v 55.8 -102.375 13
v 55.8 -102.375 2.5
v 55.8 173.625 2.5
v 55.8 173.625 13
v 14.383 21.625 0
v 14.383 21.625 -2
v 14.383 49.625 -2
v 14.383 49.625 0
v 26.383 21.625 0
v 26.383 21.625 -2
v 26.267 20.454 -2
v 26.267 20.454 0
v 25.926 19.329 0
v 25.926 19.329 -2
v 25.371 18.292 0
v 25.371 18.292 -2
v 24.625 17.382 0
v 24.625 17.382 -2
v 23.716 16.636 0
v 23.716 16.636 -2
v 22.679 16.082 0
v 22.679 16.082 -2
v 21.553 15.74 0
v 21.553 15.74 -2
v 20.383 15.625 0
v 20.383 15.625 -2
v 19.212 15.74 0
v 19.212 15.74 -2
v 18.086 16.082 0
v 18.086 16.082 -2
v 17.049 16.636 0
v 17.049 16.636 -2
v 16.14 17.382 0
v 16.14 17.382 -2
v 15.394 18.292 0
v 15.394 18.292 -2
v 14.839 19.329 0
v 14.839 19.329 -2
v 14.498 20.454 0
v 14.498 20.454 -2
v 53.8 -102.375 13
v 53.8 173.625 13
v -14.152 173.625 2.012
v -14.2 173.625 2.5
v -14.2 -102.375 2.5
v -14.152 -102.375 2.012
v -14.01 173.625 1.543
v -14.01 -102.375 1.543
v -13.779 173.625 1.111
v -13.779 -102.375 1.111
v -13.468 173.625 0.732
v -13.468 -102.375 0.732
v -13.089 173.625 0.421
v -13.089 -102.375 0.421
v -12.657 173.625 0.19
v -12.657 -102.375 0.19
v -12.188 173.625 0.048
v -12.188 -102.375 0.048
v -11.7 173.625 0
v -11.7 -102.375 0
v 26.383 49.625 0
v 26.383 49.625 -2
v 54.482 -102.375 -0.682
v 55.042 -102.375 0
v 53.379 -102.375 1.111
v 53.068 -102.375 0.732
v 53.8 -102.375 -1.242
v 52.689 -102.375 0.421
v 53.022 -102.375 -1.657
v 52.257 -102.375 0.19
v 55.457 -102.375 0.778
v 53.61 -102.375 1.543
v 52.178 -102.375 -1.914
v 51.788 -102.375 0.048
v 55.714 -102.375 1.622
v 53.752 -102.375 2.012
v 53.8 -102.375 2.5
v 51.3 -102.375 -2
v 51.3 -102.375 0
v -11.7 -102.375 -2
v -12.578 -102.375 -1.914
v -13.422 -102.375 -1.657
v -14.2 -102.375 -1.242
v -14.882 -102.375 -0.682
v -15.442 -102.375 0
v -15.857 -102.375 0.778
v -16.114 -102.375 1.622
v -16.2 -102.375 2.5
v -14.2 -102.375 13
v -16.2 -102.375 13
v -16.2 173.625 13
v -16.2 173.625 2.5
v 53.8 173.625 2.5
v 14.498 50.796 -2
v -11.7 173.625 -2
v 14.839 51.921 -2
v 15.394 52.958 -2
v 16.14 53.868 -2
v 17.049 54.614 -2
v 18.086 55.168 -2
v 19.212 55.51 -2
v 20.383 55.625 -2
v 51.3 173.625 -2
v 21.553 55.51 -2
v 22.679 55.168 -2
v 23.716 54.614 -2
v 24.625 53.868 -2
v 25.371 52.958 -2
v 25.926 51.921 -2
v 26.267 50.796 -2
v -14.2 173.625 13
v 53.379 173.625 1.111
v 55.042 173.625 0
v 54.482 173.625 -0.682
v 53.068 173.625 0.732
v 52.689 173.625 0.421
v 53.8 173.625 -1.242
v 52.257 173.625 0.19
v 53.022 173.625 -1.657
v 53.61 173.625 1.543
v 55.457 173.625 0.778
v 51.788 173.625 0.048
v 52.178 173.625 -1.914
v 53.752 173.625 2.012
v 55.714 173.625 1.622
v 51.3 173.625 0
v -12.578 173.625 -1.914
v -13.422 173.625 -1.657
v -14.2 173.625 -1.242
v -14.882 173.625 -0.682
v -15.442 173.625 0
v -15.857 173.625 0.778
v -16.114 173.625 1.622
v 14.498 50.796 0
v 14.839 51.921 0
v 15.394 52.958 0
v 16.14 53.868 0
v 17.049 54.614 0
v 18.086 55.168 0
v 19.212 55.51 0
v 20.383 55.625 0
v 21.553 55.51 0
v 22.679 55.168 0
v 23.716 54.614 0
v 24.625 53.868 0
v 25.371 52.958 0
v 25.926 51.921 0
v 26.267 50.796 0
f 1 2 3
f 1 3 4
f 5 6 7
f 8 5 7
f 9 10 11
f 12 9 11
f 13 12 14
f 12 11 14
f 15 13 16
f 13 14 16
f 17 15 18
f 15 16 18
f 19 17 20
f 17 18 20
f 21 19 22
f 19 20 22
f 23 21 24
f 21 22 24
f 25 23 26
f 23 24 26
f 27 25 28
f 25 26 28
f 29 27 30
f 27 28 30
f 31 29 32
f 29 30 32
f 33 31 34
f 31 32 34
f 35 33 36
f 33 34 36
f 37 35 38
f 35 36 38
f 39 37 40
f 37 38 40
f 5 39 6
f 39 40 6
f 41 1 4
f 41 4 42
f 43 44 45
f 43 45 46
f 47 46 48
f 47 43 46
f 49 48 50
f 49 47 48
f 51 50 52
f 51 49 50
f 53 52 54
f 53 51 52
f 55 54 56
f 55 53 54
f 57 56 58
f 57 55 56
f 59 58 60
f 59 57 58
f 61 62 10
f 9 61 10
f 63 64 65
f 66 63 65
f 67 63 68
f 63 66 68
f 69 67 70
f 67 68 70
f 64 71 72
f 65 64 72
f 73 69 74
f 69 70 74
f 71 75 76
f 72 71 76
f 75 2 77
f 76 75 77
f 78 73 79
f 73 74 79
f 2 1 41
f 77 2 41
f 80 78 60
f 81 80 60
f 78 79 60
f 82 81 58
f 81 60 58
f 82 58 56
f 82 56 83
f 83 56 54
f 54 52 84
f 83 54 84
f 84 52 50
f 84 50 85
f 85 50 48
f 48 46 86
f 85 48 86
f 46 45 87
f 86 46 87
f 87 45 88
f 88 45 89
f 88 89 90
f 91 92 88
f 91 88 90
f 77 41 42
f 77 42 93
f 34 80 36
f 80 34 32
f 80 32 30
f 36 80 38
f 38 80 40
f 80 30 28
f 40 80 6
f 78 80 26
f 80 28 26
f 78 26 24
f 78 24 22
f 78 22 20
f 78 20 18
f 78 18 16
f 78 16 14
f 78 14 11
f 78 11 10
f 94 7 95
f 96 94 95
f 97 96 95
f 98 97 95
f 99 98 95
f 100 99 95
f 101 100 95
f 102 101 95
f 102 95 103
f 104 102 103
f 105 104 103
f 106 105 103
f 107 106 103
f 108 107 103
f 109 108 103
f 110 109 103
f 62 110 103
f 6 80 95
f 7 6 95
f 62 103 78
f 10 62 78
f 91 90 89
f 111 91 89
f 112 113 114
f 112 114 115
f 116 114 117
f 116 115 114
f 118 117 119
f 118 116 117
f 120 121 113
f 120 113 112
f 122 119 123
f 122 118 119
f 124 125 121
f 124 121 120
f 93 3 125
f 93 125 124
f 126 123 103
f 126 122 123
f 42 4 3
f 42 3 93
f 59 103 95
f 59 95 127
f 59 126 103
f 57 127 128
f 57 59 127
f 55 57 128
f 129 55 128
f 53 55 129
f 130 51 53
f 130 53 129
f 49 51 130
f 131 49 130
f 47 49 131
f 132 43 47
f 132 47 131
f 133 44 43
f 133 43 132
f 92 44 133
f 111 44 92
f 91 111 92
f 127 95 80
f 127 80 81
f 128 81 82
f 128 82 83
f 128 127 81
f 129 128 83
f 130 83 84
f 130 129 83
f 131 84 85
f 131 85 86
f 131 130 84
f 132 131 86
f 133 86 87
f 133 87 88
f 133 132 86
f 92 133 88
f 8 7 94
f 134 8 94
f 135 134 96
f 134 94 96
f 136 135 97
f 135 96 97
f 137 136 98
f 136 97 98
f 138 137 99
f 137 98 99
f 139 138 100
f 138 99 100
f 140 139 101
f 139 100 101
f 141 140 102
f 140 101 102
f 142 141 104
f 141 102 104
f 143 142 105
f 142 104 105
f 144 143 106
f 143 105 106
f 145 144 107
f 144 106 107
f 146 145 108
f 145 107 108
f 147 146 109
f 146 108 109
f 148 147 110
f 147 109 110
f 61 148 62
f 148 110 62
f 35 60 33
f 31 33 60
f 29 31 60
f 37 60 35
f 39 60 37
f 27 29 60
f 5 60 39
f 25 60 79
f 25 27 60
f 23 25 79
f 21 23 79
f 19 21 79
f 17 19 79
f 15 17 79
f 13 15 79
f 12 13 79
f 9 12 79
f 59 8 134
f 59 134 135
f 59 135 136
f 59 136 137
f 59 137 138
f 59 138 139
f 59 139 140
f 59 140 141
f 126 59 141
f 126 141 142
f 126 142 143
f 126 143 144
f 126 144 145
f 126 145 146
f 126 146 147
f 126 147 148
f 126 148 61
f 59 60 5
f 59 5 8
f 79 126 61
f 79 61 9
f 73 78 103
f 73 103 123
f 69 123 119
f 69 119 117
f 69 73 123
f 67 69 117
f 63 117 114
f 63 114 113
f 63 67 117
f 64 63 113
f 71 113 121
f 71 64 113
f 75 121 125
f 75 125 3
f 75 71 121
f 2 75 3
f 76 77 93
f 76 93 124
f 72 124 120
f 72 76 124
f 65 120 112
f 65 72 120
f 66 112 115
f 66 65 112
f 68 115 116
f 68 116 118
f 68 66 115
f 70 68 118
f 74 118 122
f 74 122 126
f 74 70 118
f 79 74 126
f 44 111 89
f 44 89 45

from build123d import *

# Parameters (mm, degrees)
SKETCH1_W                    = 72
SKETCH1_H                    = 276
BASE_FLANGE1_DEPTH           = 2
EDGE_FLANGE1_STRIP_W         = 13
EDGE_FLANGE1_STRIP_H         = 2
EDGE_FLANGE1_STRIP_CUT_DEPTH = 276
EDGE_FLANGE1_DEPTH           = 276
EDGE_FLANGE2_STRIP_W         = 13
EDGE_FLANGE2_STRIP_H         = 2
EDGE_FLANGE2_STRIP_CUT_DEPTH = 276
EDGE_FLANGE2_DEPTH           = 276
CUT_EXTRUDE1_DEPTH           = 183.834024801
CUT_EXTRUDE1_DEPTH_BACK      = 183.834024801


# Sheet-metal steps are written as plain solids
with BuildPart() as part:
    # Sketch1 → Base-Flange1 (new body)
    with BuildSketch(Plane.XY):
        with Locations((19.8, 35.625)):
            Rectangle(SKETCH1_W, SKETCH1_H)
    extrude(amount=-BASE_FLANGE1_DEPTH)

    # Edge-Flange1 strip (across the edge) → Edge-Flange1 strip cut (cut)
    with BuildSketch(Plane(origin=(55.8, -102.375, 0), x_dir=(-1, 0, 0), z_dir=(0, 1, 0))):
        with Locations((-2, -1)):
            Rectangle(EDGE_FLANGE1_STRIP_W, EDGE_FLANGE1_STRIP_H)
    extrude(amount=EDGE_FLANGE1_STRIP_CUT_DEPTH, mode=Mode.SUBTRACT)

    # Edge-Flange1 section (across the edge) → Edge-Flange1 (add)
    with BuildSketch(Plane(origin=(55.8, -102.375, 0), x_dir=(-1, 0, 0), z_dir=(0, 1, 0))):
        with BuildLine():
            Line((0, 2.5), (0, 13))
            Line((0, 13), (2, 13))
            Line((2, 13), (2, 2.5))
            ThreePointArc((2, 2.5), (2.732233047, 0.732233047), (4.5, 0))
            Line((4.5, 0), (4.5, -2))
            ThreePointArc((4.5, -2), (1.318019485, -0.681980515), (0, 2.5))
        make_face()
    extrude(amount=EDGE_FLANGE1_DEPTH)

    # Edge-Flange2 strip (across the edge) → Edge-Flange2 strip cut (cut)
    with BuildSketch(Plane(origin=(-16.2, 173.625, 0), x_dir=(1, 0, 0), z_dir=(0, -1, 0))):
        with Locations((-2, -1)):
            Rectangle(EDGE_FLANGE2_STRIP_W, EDGE_FLANGE2_STRIP_H)
    extrude(amount=EDGE_FLANGE2_STRIP_CUT_DEPTH, mode=Mode.SUBTRACT)

    # Edge-Flange2 section (across the edge) → Edge-Flange2 (add)
    with BuildSketch(Plane(origin=(-16.2, 173.625, 0), x_dir=(1, 0, 0), z_dir=(0, -1, 0))):
        with BuildLine():
            Line((0, 2.5), (0, 13))
            Line((0, 13), (2, 13))
            Line((2, 13), (2, 2.5))
            ThreePointArc((2, 2.5), (2.732233047, 0.732233047), (4.5, 0))
            Line((4.5, 0), (4.5, -2))
            ThreePointArc((4.5, -2), (1.318019485, -0.681980515), (0, 2.5))
        make_face()
    extrude(amount=EDGE_FLANGE2_DEPTH)

    # Sketch12 → Cut-Extrude1 (cut, two sides: drawn at the far end of the back side and taken through both)
    with BuildSketch(Plane.XY.offset(-CUT_EXTRUDE1_DEPTH_BACK)):
        with BuildLine():
            Line((26.38258059, 49.625), (26.38258059, 21.625))
            ThreePointArc((26.38258059, 21.625), (20.38258059, 15.625), (14.38258059, 21.625))
            Line((14.38258059, 21.625), (14.38258059, 49.625))
            ThreePointArc((14.38258059, 49.625), (20.38258059, 55.625), (26.38258059, 49.625))
        make_face()
    extrude(amount=CUT_EXTRUDE1_DEPTH + CUT_EXTRUDE1_DEPTH_BACK, mode=Mode.SUBTRACT)


solid = part.part
